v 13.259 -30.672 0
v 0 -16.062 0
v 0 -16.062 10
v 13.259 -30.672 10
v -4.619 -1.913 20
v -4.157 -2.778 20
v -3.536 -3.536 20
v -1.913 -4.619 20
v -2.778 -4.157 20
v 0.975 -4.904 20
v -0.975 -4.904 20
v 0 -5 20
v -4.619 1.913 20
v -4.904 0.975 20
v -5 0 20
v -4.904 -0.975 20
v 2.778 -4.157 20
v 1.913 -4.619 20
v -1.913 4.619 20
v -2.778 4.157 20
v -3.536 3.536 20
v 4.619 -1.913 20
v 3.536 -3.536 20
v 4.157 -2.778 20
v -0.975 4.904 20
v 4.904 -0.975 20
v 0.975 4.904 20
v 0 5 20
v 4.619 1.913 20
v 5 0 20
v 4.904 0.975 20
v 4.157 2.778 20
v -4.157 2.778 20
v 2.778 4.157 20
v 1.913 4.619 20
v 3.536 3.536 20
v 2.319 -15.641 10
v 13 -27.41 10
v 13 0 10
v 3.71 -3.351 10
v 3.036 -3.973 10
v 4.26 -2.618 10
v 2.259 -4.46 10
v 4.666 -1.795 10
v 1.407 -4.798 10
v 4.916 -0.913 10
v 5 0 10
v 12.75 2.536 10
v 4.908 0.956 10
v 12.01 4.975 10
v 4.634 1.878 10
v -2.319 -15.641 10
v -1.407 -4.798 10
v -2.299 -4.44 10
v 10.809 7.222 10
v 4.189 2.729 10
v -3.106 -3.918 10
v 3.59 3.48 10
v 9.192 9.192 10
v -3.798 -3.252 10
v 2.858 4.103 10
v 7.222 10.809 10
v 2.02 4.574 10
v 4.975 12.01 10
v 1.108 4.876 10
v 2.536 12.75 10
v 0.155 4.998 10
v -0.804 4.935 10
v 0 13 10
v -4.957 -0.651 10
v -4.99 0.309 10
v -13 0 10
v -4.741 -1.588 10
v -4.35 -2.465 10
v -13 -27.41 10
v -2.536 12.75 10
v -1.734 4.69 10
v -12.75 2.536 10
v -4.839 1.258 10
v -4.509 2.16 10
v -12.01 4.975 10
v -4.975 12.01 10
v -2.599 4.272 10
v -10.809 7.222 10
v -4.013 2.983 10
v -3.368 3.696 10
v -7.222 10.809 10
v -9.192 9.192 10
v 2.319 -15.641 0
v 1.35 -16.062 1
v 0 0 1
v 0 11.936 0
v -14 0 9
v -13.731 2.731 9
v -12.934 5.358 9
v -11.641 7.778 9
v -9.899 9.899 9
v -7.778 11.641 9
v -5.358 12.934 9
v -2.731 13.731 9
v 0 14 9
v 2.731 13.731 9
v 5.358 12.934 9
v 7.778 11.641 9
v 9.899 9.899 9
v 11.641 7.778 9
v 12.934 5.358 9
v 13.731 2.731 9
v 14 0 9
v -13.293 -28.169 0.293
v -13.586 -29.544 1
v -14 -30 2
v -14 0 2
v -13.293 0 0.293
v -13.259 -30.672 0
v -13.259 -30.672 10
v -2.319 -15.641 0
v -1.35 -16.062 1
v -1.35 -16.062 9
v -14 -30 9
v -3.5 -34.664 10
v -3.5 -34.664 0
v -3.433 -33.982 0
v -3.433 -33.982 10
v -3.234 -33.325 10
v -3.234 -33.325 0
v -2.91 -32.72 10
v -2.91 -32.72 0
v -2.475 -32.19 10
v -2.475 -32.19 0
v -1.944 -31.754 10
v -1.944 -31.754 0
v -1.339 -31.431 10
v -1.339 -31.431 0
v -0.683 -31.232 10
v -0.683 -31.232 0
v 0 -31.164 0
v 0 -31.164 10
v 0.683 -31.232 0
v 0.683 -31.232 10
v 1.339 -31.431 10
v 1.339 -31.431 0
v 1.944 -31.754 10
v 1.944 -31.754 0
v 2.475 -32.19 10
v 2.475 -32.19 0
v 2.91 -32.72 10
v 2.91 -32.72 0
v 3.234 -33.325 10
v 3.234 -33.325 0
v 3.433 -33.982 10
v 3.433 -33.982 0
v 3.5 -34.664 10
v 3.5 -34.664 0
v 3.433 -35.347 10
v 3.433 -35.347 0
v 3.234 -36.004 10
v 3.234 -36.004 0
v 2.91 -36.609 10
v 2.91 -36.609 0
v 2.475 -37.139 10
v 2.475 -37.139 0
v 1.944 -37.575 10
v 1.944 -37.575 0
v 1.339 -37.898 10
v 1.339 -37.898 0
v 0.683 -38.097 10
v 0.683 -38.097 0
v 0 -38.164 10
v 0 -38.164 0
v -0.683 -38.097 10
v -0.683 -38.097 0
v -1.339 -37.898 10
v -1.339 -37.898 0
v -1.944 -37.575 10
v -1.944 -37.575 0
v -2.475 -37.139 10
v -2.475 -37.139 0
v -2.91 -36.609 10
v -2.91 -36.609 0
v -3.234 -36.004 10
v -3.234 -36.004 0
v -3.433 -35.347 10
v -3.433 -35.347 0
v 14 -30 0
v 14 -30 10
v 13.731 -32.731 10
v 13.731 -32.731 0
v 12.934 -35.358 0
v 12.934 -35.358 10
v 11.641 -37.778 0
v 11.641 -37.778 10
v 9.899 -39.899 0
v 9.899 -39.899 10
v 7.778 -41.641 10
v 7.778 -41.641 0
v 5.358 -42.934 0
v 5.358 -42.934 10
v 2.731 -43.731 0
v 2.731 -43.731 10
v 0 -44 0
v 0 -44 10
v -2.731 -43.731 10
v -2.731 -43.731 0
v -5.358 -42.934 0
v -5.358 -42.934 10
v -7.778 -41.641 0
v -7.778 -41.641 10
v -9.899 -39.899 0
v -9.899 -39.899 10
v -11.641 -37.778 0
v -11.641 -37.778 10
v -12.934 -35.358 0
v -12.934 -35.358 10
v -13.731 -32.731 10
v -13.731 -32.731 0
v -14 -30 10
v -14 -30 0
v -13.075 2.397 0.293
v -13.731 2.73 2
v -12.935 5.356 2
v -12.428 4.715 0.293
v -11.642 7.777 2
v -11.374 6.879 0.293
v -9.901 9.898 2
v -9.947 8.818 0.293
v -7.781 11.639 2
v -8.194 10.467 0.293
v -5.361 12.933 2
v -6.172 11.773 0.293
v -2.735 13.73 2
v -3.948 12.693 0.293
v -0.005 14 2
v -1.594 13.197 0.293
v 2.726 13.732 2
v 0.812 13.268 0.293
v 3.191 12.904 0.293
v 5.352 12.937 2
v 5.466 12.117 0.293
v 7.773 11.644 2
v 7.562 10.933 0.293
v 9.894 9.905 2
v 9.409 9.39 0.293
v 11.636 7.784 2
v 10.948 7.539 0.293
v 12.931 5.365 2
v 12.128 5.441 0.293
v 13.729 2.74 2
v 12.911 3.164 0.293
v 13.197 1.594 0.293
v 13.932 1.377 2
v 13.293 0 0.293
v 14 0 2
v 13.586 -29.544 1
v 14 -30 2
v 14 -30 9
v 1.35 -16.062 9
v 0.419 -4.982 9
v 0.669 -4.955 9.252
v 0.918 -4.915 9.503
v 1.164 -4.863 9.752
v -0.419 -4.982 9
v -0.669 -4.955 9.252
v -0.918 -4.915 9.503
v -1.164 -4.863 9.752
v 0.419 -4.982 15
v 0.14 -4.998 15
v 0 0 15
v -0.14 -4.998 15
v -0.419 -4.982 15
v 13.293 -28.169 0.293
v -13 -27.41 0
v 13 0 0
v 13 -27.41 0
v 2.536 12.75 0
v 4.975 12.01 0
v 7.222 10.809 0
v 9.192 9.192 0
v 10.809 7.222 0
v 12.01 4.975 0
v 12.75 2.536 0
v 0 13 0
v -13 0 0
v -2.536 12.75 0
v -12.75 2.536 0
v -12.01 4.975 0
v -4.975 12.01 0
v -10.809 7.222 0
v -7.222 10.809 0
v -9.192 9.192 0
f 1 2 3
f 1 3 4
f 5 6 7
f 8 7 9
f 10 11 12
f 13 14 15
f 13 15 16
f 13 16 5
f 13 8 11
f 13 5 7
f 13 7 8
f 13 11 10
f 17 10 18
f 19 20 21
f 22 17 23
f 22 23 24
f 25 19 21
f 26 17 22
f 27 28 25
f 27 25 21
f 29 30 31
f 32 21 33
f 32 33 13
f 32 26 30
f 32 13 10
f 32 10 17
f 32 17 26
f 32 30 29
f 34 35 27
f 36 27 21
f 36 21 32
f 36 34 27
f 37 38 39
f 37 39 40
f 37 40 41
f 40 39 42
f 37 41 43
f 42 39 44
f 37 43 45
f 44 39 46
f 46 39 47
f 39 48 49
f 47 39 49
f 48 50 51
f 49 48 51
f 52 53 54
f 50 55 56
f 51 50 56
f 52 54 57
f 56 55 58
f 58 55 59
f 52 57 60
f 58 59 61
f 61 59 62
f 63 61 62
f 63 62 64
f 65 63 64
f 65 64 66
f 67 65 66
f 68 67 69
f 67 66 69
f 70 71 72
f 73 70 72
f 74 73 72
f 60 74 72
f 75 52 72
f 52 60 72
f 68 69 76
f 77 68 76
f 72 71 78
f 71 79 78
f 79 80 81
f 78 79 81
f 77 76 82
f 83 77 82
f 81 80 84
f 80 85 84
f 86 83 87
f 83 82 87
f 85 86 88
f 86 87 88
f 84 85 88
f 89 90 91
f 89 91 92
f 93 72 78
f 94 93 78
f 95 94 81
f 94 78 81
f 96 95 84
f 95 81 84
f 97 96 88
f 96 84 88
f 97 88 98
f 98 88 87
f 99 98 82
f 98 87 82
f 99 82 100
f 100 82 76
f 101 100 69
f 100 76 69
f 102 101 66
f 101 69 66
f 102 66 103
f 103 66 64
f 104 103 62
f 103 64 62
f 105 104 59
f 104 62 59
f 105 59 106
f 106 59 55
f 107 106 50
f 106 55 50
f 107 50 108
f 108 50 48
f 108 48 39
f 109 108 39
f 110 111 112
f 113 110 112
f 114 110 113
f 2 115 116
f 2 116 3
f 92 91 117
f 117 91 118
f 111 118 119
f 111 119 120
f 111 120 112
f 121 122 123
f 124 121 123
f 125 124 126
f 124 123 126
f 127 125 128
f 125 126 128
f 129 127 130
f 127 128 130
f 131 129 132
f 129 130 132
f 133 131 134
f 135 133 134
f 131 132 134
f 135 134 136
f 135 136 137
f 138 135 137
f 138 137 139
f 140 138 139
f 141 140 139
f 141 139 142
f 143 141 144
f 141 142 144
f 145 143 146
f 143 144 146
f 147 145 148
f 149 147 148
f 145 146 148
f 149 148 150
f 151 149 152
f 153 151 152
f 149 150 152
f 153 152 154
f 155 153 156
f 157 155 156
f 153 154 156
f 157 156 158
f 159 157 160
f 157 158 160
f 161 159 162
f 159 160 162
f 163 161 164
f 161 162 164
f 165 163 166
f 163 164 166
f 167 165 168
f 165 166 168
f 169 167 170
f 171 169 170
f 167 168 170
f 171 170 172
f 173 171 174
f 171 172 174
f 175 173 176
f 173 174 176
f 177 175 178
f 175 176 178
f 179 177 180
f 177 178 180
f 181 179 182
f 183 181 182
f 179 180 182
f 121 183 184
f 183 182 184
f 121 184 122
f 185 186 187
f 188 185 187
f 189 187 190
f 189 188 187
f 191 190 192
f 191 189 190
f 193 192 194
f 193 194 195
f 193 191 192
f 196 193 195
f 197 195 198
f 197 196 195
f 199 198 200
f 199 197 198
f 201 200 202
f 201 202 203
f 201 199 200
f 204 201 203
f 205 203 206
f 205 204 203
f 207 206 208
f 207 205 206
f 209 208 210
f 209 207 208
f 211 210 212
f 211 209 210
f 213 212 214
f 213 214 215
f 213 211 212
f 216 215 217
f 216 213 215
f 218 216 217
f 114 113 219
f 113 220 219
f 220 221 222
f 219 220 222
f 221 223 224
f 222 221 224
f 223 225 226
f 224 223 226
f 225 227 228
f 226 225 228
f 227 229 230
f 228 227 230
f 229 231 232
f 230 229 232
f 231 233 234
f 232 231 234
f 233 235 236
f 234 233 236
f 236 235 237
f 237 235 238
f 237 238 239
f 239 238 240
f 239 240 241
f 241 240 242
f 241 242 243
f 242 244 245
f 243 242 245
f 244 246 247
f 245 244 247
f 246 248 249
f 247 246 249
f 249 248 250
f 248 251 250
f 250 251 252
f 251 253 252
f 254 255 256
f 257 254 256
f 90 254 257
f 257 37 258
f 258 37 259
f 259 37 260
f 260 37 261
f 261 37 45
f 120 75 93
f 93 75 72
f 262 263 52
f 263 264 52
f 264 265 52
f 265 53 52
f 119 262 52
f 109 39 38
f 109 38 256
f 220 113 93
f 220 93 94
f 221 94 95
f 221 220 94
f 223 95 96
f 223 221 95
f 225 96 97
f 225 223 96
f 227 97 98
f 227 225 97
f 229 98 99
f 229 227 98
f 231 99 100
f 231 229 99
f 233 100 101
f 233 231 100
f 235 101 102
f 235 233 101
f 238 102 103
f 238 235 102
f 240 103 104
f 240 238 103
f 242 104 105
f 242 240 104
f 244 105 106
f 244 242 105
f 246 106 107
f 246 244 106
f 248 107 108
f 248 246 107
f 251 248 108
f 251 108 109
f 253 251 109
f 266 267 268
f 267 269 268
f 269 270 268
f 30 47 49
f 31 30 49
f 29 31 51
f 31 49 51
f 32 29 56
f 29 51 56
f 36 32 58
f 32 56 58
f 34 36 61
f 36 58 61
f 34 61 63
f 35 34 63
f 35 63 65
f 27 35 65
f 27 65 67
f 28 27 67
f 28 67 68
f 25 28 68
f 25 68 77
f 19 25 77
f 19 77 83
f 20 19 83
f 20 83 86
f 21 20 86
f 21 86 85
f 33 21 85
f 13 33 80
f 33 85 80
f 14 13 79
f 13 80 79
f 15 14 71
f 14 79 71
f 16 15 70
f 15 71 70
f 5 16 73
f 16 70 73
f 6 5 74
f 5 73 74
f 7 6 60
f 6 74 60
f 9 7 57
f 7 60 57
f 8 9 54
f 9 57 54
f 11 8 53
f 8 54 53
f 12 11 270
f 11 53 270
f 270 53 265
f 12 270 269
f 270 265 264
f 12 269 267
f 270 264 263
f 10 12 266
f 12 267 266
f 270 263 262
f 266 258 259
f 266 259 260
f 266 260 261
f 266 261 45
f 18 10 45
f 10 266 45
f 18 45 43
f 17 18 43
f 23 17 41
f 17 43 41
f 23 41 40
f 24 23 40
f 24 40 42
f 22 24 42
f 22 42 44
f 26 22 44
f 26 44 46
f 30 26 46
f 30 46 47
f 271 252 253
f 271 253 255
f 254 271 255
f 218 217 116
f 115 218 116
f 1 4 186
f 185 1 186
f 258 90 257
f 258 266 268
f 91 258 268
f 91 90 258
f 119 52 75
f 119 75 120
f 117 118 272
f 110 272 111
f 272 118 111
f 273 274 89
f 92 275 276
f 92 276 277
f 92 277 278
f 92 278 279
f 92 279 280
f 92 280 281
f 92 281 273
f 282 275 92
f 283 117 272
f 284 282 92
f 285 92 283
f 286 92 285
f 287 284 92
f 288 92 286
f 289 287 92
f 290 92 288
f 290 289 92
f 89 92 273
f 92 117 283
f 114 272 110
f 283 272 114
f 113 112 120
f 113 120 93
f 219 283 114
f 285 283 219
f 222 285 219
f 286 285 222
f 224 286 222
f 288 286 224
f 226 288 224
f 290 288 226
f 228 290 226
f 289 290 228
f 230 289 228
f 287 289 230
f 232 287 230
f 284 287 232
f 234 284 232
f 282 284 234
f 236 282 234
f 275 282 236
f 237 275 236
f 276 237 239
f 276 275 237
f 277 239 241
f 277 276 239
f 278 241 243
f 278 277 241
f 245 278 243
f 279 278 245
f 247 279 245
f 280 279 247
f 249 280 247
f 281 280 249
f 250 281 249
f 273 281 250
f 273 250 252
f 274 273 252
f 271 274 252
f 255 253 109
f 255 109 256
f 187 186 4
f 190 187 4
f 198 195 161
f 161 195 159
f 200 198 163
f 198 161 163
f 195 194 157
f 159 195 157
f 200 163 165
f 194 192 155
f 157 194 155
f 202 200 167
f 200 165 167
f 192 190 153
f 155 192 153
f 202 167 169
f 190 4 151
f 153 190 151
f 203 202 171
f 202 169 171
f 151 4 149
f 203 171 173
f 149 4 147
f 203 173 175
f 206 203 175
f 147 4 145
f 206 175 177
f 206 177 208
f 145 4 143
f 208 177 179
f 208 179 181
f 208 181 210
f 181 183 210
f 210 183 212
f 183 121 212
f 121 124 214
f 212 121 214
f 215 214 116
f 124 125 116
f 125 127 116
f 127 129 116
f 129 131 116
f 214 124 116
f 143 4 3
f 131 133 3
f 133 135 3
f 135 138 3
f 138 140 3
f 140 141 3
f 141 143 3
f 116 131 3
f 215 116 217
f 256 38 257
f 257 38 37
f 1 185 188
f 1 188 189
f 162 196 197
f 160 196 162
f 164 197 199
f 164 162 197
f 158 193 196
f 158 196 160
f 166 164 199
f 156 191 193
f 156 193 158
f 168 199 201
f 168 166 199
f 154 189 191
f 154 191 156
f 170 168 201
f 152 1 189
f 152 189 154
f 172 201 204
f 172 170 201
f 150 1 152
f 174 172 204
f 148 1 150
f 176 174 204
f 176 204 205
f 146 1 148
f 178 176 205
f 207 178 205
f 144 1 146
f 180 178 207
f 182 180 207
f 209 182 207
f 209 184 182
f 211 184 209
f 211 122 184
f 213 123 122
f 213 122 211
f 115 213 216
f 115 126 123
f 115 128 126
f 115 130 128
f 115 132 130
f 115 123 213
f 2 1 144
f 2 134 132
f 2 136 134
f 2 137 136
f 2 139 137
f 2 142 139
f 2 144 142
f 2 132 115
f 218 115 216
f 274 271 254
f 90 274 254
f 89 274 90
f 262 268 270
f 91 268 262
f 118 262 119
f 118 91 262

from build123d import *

# Parameters (mm, degrees)
BOSS_EXTRUDE1_DEPTH = 10
SKETCH2_R           = 5
BOSS_EXTRUDE2_DEPTH = 10
CUT_EXTRUDE10_DEPTH = 15
CHAMFER1_SIZE       = 1
CHAMFER2_SIZE       = 1
CHAMFER3_SIZE       = 1
CHAMFER4_SIZE       = 1
CHAMFER5_SIZE       = 1
SKETCH3_R           = 3.5
CUT_EXTRUDE11_DEPTH = 10


with BuildPart() as part:
    # Sketch1 → Boss-Extrude1 (new body)
    with BuildSketch(Plane.XY):
        with BuildLine():
            Line((14, 0), (14, -30))
            ThreePointArc((14, -30), (0, -44), (-14, -30))
            Line((-14, -30), (-14, 0))
            ThreePointArc((-14, 0), (0, 14), (14, 0))
        make_face()
    extrude(amount=BOSS_EXTRUDE1_DEPTH)

    # Sketch2 → Boss-Extrude2 (add)
    with BuildSketch(Plane.XY.offset(10)):
        Circle(SKETCH2_R)
    extrude(amount=BOSS_EXTRUDE2_DEPTH)

    # Sketch5 → Cut-Extrude10 (cut)
    with BuildSketch(Plane(origin=(0, 0, 0), x_dir=(-1, 0, 0), z_dir=(0, 0, -1))):
        Polygon((-14, -30), (-1.350424067, -16.061825706), (0, 0), (1.350424067, -16.061825706), (14, -30), (13.25949187, -30.672047401), (0, -16.061825706), (-13.25949187, -30.672047401), align=None)
    extrude(amount=-CUT_EXTRUDE10_DEPTH, mode=Mode.SUBTRACT)


with BuildPart() as cut_extrude10_piece_1:
    # of the separate pieces the step leaves, piece 1, a body of its own (cut_extrude10_pieces)
    add(part.part.solids().sort_by_distance((-14, 0, 0))[0])

    # Chamfer1
    chamfer1_edges = [cut_extrude10_piece_1.edges().sort_by_distance(p)[0] for p in [
        (0, 14, 10),
        (-14, -15, 10),
        (14, -15, 10),
    ]]
    chamfer(chamfer1_edges, length=CHAMFER1_SIZE)

    # Chamfer2
    chamfer2_edges = [cut_extrude10_piece_1.edges().sort_by_distance(p)[0] for p in [
        (0, 14, 0),
        (-14, -15, 0),
        (14, -15, 0),
    ]]
    chamfer(chamfer2_edges, length=CHAMFER2_SIZE)

    # Chamfer3
    chamfer3_edges = [cut_extrude10_piece_1.edges().sort_by_distance(p)[0] for p in [
        (-7.175212033, -22.479978404, 0),
        (7.175212033, -22.479978404, 0),
        (0.675212033, -8.030912853, 0),
        (-0.675212033, -8.030912853, 0),
    ]]
    chamfer(chamfer3_edges, length=CHAMFER3_SIZE)

    # Chamfer4
    chamfer4_edges = [cut_extrude10_piece_1.edges().sort_by_distance(p)[0] for p in [
        (-7.175212033, -22.479978404, 10),
        (-0.884664598, -10.522123326, 10),
        (7.175212033, -22.479978404, 10),
        (0.884664598, -10.522123326, 10),
    ]]
    chamfer(chamfer4_edges, length=CHAMFER4_SIZE)

    # Chamfer5
    chamfer5_edges = [cut_extrude10_piece_1.edges().sort_by_distance(p)[0] for p in [
        (-14, -15, 1),
        (0, 14, 1),
        (14, -15, 1),
    ]]
    chamfer(chamfer5_edges, length=CHAMFER5_SIZE)


with BuildPart() as cut_extrude10_piece_2:
    # of the separate pieces the step leaves, piece 2, a body of its own (cut_extrude10_pieces)
    add(part.part.solids().sort_by_distance((13.25949187, -30.672047401, 0))[0])

    # Sketch3 → Cut-Extrude11 (cut)
    with BuildSketch(Plane(origin=(0, 0, 0), x_dir=(-1, 0, 0), z_dir=(0, 0, -1))):
        with Locations((0, -34.664450994)):
            Circle(SKETCH3_R)
    extrude(amount=-CUT_EXTRUDE11_DEPTH, mode=Mode.SUBTRACT)


solid = Compound([cut_extrude10_piece_1.part, cut_extrude10_piece_2.part])
